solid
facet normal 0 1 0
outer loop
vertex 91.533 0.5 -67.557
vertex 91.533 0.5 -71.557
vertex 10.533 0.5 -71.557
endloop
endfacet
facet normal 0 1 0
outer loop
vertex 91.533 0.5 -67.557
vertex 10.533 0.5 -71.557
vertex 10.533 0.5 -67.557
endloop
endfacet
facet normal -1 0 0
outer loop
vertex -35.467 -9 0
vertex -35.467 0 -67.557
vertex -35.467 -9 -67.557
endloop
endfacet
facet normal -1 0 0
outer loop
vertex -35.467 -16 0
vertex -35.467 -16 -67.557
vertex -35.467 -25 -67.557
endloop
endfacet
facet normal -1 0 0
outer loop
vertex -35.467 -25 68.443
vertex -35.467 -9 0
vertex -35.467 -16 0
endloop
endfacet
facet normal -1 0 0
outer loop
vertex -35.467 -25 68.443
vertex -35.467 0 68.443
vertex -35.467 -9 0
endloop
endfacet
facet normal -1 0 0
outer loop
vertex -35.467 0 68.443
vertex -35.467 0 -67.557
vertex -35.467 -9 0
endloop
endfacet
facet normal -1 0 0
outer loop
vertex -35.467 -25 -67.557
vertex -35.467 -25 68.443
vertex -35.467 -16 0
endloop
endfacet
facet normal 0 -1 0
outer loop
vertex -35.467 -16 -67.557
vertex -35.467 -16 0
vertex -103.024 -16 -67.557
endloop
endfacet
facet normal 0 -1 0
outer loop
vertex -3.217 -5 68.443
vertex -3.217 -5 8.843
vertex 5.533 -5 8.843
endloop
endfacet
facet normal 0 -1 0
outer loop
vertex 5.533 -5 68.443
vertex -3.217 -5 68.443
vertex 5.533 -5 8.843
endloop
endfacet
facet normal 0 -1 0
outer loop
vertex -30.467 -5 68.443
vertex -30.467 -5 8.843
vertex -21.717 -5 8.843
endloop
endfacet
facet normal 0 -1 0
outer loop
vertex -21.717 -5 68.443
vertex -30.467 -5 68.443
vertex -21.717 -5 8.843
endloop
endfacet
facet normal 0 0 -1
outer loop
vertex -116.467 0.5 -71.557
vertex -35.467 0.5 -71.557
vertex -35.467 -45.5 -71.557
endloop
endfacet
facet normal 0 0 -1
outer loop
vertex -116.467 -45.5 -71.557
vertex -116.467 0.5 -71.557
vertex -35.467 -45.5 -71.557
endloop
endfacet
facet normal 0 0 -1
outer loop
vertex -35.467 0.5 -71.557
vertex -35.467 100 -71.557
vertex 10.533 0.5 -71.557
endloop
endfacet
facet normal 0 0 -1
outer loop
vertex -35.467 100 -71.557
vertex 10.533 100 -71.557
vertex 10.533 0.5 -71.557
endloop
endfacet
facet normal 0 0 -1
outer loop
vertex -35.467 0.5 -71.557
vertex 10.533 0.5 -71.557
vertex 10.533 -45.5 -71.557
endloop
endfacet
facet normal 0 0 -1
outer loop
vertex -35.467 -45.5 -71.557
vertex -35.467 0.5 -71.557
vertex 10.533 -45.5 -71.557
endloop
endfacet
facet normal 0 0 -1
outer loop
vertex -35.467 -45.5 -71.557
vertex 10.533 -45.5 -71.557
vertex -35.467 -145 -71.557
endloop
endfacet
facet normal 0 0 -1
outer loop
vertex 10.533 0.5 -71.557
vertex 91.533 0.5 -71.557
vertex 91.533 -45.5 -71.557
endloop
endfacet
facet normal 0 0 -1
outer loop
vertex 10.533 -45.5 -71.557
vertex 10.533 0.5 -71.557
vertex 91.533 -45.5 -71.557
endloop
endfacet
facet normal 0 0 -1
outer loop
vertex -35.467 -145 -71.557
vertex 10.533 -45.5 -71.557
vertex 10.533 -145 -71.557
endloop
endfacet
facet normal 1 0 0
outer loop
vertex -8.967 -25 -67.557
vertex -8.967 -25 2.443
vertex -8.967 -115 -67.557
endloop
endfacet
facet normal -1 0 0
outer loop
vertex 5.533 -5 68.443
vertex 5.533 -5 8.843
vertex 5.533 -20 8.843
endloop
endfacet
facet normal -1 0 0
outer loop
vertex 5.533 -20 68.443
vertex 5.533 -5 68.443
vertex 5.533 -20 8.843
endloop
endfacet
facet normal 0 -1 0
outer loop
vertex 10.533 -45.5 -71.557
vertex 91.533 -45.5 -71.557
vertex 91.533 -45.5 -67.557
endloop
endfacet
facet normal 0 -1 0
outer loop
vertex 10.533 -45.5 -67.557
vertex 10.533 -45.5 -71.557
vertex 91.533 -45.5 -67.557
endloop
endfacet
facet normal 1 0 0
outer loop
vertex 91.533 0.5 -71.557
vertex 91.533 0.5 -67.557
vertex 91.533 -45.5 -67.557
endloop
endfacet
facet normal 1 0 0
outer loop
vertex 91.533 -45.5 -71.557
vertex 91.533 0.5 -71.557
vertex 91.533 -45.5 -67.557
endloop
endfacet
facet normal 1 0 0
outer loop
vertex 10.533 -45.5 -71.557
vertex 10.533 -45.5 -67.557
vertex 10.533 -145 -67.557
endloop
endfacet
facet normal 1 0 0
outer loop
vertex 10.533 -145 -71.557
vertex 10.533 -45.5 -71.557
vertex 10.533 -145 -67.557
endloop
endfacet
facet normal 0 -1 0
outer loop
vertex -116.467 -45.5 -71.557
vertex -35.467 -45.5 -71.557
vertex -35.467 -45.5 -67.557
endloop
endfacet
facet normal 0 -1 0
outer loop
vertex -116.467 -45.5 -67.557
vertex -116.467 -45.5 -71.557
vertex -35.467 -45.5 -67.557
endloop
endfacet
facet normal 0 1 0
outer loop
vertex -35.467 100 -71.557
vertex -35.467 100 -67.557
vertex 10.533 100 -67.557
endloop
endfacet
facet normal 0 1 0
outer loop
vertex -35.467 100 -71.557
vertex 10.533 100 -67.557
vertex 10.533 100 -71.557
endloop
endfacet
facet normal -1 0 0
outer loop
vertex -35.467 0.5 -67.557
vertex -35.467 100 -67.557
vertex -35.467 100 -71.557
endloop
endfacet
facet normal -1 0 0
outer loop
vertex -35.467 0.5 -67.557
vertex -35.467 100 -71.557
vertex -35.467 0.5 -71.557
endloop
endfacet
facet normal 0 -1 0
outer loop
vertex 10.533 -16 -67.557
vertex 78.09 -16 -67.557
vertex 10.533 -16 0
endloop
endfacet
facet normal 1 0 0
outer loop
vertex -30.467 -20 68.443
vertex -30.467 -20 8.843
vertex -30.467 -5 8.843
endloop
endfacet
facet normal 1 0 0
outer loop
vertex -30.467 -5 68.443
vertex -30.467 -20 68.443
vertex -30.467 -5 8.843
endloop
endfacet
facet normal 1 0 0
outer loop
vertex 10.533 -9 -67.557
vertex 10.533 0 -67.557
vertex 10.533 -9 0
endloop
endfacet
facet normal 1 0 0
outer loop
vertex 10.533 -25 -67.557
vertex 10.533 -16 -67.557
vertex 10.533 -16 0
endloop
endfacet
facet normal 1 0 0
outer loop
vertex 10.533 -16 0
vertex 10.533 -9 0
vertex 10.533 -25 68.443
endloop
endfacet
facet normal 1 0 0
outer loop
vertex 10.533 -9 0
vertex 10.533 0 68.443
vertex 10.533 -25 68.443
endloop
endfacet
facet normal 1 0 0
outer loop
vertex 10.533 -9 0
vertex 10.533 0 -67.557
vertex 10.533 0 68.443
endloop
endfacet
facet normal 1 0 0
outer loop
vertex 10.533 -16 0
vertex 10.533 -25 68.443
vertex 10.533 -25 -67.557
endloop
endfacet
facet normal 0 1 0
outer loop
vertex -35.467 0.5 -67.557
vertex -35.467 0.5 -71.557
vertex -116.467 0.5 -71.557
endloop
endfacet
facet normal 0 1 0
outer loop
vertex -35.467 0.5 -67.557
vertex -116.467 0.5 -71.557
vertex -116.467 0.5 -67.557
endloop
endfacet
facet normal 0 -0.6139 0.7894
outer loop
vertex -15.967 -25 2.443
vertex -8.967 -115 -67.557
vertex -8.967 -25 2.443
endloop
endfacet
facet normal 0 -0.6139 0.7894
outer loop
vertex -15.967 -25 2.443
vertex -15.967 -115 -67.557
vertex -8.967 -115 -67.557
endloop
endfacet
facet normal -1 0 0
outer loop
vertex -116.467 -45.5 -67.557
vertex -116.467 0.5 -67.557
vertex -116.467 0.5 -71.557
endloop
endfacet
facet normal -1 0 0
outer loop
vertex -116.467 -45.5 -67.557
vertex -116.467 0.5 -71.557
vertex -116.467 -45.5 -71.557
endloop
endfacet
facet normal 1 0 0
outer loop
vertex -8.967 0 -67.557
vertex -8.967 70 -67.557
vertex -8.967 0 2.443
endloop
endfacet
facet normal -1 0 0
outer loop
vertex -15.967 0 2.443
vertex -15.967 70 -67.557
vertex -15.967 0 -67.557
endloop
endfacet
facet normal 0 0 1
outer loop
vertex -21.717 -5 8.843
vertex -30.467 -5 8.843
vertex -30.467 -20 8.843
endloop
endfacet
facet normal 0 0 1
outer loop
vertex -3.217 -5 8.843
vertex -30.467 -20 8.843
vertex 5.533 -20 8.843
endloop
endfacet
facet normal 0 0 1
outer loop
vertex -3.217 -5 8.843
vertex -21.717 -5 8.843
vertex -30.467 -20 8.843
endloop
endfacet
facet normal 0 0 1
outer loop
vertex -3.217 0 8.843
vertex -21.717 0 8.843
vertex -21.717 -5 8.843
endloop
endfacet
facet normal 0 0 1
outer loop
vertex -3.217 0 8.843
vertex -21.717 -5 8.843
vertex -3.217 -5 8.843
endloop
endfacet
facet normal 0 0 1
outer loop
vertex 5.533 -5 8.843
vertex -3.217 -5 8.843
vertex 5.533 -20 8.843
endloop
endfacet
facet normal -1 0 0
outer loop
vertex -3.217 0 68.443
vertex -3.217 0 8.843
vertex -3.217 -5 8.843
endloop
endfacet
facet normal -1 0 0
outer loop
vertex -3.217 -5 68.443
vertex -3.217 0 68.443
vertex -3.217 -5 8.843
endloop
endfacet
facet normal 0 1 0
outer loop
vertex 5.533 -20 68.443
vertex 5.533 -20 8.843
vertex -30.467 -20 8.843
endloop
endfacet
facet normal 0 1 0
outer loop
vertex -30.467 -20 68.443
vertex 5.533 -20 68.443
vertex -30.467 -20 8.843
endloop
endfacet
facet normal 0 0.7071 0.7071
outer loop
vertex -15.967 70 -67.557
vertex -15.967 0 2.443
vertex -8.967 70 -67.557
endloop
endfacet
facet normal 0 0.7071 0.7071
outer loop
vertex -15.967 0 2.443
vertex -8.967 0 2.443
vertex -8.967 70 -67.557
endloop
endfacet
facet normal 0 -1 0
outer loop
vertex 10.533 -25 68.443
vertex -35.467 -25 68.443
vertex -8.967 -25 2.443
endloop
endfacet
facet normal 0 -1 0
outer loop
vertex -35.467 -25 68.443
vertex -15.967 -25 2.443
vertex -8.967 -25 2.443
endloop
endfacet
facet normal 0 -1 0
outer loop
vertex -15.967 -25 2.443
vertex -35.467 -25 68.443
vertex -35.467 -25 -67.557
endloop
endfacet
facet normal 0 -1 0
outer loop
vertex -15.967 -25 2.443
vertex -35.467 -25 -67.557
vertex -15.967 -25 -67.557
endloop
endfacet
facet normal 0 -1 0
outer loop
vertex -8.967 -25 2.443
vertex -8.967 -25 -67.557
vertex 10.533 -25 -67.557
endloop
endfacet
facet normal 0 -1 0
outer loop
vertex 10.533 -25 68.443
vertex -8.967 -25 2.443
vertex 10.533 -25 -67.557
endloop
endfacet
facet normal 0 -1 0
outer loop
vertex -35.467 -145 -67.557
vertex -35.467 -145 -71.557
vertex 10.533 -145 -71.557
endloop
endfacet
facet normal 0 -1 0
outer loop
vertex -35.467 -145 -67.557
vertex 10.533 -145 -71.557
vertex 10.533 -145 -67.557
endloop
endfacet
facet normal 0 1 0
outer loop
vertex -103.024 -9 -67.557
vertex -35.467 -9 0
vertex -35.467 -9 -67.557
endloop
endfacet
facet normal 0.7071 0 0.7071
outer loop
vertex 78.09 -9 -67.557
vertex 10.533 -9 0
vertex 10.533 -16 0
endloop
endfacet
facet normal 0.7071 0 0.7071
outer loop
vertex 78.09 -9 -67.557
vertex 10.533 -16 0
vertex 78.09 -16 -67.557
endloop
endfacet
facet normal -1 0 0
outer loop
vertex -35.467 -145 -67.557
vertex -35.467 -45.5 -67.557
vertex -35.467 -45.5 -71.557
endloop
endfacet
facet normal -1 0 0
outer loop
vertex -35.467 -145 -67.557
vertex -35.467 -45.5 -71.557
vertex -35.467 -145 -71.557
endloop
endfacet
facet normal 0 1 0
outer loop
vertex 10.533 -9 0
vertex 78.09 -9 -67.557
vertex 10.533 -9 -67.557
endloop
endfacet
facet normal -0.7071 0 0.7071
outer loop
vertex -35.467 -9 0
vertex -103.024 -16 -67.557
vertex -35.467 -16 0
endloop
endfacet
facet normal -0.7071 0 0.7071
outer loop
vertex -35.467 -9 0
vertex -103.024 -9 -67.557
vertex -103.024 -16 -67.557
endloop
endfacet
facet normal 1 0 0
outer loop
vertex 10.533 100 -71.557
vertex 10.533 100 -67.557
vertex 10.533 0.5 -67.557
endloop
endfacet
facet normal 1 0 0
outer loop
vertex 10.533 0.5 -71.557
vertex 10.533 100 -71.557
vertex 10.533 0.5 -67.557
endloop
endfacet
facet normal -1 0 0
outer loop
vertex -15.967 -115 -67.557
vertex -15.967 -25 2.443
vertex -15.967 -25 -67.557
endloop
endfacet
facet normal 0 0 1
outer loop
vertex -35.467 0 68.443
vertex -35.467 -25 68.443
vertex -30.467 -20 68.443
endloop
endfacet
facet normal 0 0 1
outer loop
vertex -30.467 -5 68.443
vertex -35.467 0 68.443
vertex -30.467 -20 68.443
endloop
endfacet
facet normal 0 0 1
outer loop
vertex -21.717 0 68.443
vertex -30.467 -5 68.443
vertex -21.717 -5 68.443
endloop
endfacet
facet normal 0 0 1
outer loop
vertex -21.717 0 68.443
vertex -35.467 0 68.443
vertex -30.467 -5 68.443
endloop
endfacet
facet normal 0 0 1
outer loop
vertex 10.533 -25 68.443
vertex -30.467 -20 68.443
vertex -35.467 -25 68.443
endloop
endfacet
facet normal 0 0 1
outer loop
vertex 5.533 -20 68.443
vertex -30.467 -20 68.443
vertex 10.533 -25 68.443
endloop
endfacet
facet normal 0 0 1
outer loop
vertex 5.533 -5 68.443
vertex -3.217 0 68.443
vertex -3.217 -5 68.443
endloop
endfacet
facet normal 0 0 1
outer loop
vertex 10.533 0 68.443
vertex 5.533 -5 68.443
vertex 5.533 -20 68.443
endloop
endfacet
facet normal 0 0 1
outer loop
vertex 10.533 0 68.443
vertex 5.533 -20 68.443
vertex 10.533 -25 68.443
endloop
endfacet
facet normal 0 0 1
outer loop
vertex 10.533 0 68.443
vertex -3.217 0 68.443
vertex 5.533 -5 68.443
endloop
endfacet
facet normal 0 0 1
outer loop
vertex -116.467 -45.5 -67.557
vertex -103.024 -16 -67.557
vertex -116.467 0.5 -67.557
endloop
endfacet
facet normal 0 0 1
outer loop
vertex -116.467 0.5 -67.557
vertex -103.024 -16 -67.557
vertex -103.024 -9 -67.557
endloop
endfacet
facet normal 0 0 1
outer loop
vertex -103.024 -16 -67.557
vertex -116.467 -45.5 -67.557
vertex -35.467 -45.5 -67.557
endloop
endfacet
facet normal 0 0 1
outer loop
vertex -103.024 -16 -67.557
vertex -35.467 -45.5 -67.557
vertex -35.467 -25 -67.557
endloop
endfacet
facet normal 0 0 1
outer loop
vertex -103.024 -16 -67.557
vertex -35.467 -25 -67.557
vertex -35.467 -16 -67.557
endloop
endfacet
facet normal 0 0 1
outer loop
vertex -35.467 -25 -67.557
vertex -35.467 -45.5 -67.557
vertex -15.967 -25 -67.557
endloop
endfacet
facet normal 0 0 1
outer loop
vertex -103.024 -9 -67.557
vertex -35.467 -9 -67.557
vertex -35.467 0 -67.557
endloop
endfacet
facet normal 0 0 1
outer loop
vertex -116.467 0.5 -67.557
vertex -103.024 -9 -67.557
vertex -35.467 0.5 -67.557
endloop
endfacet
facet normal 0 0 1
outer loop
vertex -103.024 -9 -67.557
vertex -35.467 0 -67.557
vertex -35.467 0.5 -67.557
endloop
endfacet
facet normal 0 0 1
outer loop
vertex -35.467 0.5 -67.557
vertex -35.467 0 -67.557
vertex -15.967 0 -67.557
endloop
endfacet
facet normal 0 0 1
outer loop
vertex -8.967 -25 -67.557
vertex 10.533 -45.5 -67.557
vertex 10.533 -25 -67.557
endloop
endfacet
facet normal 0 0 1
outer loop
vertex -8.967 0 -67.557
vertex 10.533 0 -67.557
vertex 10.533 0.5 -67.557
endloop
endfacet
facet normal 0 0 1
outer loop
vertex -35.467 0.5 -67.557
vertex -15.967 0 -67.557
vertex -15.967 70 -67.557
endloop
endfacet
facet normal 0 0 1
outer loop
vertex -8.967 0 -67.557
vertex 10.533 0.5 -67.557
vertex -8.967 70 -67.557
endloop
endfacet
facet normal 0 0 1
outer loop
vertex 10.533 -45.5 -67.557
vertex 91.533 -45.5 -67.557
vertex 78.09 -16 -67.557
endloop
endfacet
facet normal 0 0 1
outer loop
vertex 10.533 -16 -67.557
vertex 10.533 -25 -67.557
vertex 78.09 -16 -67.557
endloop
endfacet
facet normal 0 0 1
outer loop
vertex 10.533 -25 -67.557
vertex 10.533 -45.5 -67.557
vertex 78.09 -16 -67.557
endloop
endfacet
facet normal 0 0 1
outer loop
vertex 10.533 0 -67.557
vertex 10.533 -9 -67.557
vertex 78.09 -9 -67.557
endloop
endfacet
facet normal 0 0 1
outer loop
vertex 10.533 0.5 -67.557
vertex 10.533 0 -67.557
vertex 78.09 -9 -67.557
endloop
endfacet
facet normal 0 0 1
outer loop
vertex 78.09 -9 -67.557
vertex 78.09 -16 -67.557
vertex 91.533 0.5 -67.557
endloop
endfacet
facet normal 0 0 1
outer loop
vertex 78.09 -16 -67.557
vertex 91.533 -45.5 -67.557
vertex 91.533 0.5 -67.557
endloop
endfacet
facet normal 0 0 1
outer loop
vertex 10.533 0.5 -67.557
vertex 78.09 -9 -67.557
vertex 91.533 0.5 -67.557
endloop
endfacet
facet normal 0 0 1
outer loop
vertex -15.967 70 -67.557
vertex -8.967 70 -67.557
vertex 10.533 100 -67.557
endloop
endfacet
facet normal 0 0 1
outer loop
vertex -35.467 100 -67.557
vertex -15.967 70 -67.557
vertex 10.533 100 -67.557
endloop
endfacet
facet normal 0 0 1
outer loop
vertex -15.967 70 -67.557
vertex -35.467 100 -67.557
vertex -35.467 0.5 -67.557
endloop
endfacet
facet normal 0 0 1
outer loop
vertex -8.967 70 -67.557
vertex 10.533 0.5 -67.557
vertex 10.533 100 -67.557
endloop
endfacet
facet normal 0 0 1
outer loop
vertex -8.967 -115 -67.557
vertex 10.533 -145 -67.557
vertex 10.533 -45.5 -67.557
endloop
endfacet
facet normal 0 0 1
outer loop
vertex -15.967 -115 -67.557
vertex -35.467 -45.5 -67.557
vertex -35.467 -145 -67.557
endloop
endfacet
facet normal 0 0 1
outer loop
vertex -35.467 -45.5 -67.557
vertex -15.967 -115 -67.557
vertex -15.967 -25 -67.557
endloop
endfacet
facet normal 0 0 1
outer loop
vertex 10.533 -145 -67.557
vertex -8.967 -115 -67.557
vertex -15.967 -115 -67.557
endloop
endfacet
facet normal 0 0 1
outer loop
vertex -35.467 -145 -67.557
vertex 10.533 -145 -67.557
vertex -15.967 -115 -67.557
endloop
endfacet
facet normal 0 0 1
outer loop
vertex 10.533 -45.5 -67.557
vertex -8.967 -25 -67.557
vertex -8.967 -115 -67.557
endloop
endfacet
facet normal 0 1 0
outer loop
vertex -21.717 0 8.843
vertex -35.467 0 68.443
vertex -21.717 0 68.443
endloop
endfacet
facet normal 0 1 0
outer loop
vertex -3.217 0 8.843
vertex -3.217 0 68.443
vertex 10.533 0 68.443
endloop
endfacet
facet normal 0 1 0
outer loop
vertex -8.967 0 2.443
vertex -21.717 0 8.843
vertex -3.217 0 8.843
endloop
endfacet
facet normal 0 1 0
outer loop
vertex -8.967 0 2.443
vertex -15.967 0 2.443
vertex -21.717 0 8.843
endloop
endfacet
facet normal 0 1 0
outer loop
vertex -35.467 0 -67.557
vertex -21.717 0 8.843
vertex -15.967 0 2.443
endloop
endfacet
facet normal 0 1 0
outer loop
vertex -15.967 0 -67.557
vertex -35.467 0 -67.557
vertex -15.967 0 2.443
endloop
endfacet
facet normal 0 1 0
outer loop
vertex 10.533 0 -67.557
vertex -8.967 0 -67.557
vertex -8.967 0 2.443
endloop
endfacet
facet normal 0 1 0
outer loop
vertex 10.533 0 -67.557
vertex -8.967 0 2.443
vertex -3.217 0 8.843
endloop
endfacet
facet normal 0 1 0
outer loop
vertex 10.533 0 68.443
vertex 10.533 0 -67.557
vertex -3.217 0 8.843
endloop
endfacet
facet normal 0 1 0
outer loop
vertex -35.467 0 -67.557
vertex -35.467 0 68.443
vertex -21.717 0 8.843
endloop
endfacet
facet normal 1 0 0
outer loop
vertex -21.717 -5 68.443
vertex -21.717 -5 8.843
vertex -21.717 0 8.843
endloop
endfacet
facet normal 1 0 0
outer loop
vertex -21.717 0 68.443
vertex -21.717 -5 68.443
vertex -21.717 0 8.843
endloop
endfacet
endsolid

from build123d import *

# Parameters (mm, degrees)
F0_W           = 46
F0_H           = 80
F1_DEPTH       = 25
F4_DEPTH       = 60
F2_W           = 0.5
F2_H           = 4
F2_W_2         = 20.5
F5_DEPTH       = 46
F8_DEPTH       = 3.5
F10_DEPTH      = 0.4
F2_W_3         = 25
F11_DEPTH      = 81
F11_DEPTH_BACK = 127
F14_DEPTH      = 3.5


with BuildPart() as f1:
    # F0 (on Front) → F1 (new body)
    with BuildSketch(Plane.XZ):
        with Locations((-12.4670048244, -31.5567021806)):
            Rectangle(F0_W, F0_H)
    extrude(amount=F1_DEPTH)

    # F3 (on face) → F4 (join)
    with BuildSketch(Plane.XY.offset(8.4432978194)):
        Polygon((10.5329951756, -25), (10.5329951756, 0), (-3.2170048244, 0), (-3.2170048244, -5), (5.5329951756, -5), (5.5329951756, -20), (-30.4670048244, -20), (-30.4670048244, -5), (-21.7170048244, -5), (-21.7170048244, 0), (-35.4670048244, 0), (-35.4670048244, -25), align=None)
    extrude(amount=F4_DEPTH)

    # F2 (on face) → F5 (join)
    with BuildSketch(Plane(origin=(-35.4670048244, 0, 0), x_dir=(0, -1, 0), z_dir=(-1, 0, 0))):
        with Locations((-0.25, -69.5567021806)):
            Rectangle(F2_W, F2_H)
        with Locations((35.25, -69.5567021806)):
            Rectangle(F2_W_2, F2_H)
        Polygon((-100, -71.5567021806), (-0.5, -71.5567021806), (-0.5, -67.5567021806), (-70, -67.5567021806), (-100, -67.5567021806), align=None)
        Polygon((45.5, -67.5567021806), (45.5, -71.5567021806), (145, -71.5567021806), (145, -67.5567021806), (115, -67.5567021806), align=None)
    extrude(amount=-F5_DEPTH)

    # F7 (on offset) → F8 (join, symmetric)
    with BuildSketch(Plane(origin=(-12.4670048244, 0, 0), x_dir=(0, -1, 0), z_dir=(-1, 0, 0))):
        Polygon((0, -67.5567021806), (0, 2.4432978194), (-70, -67.5567021806), align=None)
        Polygon((25, 2.4432978194), (25, -67.5567021806), (115, -67.5567021806), align=None)
    extrude(amount=F8_DEPTH, both=True)

    # F10 (add, through all): a face of the model
    f10_faces = [f1.faces().sort_by_distance(p)[0] for p in [
        (-12.4670048244, -11.0375494071, 8.4432978194),
    ]]
    extrude(f10_faces, amount=F10_DEPTH)

    # F2 (on face) → F11 (join, two sides)
    with BuildSketch(Plane(origin=(-35.4670048244, 0, 0), x_dir=(0, -1, 0), z_dir=(-1, 0, 0))) as f11_sk:
        with Locations((-0.25, -69.5567021806)):
            Rectangle(F2_W, F2_H)
        with Locations((12.5, -69.5567021806)):
            Rectangle(F2_W_3, F2_H)
        with Locations((35.25, -69.5567021806)):
            Rectangle(F2_W_2, F2_H)
    extrude(amount=F11_DEPTH)
    extrude(f11_sk.sketch, amount=-F11_DEPTH_BACK)

    # F13 (on offset) → F14 (join, symmetric)
    with BuildSketch(Plane(origin=(0, -12.5, 0), x_dir=(-1, 0, 0), z_dir=(0, 1, 0))):
        Polygon((103.0237070051, -67.5567021806), (35.4670048244, 0), (-10.5329951756, 0), (-78.0896973562, -67.5567021806), align=None)
    extrude(amount=F14_DEPTH, both=True)


solid = f1.part
